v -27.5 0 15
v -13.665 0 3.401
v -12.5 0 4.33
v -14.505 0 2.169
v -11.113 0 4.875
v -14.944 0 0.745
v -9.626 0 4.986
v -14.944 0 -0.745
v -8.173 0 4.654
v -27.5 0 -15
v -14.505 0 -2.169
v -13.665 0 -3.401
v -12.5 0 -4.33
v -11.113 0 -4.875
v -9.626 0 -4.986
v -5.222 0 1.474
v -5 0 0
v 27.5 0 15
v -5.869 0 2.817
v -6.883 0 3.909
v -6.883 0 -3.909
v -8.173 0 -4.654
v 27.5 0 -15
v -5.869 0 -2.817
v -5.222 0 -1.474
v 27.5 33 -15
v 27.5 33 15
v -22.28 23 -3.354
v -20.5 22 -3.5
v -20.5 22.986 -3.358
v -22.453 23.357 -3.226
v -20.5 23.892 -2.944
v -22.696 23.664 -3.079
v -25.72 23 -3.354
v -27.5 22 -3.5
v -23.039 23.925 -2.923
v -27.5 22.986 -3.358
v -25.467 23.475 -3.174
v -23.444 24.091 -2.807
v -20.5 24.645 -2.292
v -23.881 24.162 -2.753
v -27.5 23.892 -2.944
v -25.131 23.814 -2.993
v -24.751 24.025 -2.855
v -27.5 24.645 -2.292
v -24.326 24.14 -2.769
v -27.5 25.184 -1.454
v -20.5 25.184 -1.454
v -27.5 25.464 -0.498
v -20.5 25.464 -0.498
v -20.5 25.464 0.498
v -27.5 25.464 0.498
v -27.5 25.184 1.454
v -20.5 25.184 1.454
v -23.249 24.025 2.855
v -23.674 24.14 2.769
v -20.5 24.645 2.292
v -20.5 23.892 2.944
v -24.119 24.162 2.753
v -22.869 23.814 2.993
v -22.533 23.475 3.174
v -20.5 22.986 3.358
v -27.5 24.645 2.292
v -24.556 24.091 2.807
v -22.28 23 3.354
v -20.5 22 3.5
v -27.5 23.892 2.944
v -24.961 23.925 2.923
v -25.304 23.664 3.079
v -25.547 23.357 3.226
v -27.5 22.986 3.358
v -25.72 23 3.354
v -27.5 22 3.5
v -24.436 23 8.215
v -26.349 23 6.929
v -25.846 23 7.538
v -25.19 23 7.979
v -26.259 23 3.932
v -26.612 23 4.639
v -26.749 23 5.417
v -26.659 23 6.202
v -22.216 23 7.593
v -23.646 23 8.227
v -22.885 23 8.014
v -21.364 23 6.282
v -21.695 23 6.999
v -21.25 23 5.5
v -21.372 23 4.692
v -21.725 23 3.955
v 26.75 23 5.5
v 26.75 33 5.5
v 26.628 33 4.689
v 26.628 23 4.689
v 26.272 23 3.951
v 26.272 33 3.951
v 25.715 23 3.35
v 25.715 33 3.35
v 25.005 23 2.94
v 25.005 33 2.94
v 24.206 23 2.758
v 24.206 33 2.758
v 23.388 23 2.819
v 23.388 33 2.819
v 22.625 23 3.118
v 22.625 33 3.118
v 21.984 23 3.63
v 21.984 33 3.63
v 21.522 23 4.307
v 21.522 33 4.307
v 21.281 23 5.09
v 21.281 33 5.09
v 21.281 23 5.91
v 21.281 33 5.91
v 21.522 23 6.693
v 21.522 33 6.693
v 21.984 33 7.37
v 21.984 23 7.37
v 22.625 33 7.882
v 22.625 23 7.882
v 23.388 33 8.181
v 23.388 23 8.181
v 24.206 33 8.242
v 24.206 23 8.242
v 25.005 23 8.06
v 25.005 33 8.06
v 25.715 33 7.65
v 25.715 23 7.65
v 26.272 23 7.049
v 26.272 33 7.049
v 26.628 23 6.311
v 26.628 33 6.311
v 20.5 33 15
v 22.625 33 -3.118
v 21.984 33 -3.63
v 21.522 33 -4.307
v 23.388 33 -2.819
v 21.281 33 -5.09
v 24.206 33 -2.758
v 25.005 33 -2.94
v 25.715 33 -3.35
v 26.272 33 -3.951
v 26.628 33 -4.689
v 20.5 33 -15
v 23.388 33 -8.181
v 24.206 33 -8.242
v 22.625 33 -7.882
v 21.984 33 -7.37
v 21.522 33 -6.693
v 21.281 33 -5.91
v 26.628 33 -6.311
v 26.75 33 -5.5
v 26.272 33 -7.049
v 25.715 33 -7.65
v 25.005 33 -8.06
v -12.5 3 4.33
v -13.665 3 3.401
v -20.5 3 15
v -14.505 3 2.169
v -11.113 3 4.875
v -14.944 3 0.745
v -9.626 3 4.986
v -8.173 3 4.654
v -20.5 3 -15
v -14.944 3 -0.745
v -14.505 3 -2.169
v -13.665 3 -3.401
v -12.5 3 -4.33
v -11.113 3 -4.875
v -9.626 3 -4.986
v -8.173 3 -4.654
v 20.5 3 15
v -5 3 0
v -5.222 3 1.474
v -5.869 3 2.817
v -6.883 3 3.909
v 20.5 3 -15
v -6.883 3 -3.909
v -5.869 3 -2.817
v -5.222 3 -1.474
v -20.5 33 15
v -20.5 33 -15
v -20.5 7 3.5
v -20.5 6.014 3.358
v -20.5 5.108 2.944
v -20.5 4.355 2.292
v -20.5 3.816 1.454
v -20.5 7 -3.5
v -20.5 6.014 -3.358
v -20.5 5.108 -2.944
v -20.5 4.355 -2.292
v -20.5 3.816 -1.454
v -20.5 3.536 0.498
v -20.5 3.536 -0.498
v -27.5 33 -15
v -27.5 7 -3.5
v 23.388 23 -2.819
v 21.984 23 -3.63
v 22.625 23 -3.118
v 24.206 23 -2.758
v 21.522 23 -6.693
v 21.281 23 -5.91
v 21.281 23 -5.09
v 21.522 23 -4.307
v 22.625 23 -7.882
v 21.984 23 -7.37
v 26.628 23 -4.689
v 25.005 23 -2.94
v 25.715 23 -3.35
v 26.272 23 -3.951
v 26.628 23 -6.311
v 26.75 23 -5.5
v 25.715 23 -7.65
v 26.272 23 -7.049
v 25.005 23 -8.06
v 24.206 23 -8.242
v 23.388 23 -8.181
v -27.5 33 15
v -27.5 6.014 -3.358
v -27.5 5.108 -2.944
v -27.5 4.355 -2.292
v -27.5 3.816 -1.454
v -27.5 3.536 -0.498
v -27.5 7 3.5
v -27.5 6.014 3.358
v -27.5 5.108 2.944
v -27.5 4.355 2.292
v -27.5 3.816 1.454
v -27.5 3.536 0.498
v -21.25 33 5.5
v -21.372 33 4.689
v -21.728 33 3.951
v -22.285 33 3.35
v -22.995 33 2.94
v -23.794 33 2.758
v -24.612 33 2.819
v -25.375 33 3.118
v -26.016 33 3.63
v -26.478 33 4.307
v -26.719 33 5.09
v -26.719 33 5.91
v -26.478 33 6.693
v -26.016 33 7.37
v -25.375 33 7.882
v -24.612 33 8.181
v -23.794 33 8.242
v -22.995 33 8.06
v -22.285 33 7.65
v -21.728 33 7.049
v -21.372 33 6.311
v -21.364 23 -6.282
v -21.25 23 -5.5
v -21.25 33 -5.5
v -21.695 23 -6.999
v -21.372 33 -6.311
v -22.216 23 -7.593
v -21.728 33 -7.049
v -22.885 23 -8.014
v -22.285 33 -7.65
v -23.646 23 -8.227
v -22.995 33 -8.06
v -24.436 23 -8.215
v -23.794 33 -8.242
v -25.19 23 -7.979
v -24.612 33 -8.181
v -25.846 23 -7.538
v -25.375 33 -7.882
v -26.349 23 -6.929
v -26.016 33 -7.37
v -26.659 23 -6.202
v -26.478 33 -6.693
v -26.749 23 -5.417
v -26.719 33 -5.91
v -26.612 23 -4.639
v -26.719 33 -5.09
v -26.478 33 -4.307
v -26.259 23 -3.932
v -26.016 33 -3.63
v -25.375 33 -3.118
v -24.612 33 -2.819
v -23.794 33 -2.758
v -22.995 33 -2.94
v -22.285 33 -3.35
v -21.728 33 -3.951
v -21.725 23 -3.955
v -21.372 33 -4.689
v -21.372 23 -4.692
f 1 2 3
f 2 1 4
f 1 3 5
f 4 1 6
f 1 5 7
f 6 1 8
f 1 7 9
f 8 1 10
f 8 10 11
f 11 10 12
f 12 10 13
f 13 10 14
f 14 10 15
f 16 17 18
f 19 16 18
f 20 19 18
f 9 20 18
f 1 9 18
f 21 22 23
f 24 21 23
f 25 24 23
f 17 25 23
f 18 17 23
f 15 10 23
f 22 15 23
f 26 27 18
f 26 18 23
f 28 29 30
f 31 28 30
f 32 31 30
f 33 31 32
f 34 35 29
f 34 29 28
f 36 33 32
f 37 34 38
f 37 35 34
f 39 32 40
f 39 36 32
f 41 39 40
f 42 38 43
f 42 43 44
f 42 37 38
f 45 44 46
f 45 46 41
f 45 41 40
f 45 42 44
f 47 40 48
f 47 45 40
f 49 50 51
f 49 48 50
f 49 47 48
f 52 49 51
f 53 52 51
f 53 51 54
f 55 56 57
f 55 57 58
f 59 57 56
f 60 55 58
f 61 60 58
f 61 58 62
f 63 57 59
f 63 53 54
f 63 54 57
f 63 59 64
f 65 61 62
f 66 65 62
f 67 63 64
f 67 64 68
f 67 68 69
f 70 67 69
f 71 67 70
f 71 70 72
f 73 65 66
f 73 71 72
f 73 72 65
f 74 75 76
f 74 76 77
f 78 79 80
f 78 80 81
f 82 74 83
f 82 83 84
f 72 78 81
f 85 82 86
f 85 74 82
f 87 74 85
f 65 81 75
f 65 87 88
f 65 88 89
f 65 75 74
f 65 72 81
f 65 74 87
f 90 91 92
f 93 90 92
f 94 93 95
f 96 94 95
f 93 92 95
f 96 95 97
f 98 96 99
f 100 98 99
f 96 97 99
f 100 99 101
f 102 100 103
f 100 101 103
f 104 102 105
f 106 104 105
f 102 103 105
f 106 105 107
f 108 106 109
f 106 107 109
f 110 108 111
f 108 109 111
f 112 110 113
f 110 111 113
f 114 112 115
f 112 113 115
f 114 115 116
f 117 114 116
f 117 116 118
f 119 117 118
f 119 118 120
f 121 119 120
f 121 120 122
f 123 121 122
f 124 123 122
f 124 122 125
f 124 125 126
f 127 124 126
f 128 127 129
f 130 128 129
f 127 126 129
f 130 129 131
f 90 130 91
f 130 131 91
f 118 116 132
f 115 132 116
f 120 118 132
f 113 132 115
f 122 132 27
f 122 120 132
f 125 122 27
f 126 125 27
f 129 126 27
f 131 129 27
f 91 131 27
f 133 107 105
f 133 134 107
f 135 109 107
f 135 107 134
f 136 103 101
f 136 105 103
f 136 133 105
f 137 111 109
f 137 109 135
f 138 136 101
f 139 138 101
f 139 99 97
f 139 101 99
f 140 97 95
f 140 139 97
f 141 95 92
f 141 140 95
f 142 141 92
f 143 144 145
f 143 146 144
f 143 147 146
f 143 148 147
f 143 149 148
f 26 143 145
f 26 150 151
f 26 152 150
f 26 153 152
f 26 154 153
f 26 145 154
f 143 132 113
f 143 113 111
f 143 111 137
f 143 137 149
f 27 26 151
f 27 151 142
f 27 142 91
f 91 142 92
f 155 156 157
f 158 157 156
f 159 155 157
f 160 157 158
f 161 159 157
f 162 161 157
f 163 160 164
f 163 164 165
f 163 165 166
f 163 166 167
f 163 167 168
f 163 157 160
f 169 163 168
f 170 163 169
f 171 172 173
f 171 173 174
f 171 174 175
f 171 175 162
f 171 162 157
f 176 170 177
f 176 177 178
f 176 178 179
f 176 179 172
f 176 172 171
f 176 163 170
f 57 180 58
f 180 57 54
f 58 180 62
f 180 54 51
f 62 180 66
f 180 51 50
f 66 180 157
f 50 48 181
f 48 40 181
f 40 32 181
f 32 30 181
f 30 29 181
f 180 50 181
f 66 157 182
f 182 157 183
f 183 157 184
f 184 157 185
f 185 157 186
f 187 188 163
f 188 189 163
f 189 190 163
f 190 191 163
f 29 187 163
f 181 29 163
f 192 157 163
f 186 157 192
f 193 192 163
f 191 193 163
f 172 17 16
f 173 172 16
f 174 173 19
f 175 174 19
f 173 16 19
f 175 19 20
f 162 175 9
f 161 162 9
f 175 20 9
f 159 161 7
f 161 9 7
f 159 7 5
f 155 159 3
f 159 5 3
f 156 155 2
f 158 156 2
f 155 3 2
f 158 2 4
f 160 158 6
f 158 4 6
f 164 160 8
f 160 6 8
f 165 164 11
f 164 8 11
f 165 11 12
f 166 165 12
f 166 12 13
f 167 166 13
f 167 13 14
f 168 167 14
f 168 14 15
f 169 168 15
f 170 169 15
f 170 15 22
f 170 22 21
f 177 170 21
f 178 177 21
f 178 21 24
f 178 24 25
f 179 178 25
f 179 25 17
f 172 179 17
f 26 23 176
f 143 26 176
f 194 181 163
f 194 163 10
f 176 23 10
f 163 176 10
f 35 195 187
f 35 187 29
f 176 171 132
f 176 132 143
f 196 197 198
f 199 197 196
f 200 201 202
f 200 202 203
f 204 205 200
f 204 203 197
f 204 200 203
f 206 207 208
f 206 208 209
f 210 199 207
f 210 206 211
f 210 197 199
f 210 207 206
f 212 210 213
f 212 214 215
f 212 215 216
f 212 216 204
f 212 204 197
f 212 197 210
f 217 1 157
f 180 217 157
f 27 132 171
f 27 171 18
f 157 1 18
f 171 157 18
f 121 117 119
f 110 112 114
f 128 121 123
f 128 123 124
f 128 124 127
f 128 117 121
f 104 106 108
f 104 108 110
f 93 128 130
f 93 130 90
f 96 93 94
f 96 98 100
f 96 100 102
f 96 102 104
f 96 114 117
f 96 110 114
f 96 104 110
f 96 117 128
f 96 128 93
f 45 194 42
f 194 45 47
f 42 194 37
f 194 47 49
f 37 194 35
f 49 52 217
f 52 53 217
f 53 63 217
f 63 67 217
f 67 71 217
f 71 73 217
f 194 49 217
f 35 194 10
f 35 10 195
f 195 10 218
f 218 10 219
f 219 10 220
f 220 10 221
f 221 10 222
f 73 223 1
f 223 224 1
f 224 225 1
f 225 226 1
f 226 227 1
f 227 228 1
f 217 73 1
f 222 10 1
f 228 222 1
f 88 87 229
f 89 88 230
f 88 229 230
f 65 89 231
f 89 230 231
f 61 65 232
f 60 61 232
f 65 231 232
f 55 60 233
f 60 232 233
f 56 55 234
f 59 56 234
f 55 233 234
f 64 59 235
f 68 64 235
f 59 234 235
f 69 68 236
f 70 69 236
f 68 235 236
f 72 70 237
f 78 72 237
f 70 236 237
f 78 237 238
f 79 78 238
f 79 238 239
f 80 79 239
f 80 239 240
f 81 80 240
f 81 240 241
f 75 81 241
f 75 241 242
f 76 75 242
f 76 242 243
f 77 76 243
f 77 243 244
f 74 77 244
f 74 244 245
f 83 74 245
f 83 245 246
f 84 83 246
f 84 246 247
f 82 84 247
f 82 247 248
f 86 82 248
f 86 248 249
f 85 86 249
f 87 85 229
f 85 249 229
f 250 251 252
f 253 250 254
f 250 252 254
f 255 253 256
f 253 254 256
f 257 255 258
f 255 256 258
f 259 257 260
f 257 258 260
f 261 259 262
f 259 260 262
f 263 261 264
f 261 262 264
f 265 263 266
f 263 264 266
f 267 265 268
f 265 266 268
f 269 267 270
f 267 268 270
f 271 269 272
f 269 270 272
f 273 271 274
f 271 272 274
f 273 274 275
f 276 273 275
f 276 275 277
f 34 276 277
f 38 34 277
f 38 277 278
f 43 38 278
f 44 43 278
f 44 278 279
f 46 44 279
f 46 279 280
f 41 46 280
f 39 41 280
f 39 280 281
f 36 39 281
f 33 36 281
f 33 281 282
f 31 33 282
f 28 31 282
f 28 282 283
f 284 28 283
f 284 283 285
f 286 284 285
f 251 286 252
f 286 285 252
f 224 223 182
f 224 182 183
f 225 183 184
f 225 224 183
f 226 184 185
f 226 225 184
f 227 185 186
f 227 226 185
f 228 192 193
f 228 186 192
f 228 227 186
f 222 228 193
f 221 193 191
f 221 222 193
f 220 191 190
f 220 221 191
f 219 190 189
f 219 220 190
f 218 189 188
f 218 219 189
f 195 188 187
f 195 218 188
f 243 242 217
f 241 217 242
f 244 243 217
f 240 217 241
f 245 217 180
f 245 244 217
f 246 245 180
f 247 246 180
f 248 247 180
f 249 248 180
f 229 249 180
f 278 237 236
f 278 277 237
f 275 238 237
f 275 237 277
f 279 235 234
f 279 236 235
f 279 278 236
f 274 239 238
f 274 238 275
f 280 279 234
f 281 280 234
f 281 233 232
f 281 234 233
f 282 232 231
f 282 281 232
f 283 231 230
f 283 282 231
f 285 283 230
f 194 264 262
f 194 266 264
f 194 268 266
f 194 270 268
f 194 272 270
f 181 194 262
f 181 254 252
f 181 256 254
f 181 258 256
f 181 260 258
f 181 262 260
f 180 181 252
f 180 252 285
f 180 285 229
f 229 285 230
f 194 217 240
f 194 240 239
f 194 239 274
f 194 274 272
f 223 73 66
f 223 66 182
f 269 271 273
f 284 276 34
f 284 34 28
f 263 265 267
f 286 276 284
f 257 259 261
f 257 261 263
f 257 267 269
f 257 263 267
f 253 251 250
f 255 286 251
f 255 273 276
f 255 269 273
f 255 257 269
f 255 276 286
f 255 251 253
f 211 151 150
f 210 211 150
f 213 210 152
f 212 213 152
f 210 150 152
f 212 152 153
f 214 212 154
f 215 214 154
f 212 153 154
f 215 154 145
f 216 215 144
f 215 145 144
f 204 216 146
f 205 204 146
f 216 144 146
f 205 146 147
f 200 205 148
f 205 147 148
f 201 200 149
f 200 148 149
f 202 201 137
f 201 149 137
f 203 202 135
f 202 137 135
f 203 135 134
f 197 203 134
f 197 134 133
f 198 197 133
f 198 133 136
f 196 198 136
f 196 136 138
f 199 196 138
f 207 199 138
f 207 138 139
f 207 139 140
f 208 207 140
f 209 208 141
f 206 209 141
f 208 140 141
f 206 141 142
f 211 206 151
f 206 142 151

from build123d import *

# Parameters (mm, degrees)
SKETCH1_W           = 55
SKETCH1_H           = 30
BOSS_EXTRUDE1_DEPTH = 3
SKETCH2_W           = 7
SKETCH2_H           = 30
BOSS_EXTRUDE2_DEPTH = 30
SKETCH3_R           = 2.75
CUT_EXTRUDE1_DEPTH  = 10
CUT_EXTRUDE2_REACH  = 57
CUT_EXTRUDE3_REACH  = 35
SKETCH5_R           = 5


with BuildPart() as part:
    # Sketch1 → Boss-Extrude1 (new body)
    with BuildSketch(Plane(origin=(0, 0, 0), x_dir=(1, 0, 0), z_dir=(0, 1, 0))):
        Rectangle(SKETCH1_W, SKETCH1_H)
    extrude(amount=BOSS_EXTRUDE1_DEPTH)

    # Sketch2 → Boss-Extrude2 (add)
    with BuildSketch(Plane(origin=(0, 3, 0), x_dir=(1, 0, 0), z_dir=(0, 1, 0))):
        Polygon((-27.5, -12), (-27.5, -15), (-20.5, -15), (-20.5, 15), (-27.5, 15), align=None)
        with Locations((24, 0)):
            Rectangle(SKETCH2_W, SKETCH2_H)
    extrude(amount=BOSS_EXTRUDE2_DEPTH)

    # Sketch3 → Cut-Extrude1 (cut)
    with BuildSketch(Plane(origin=(0, 33, 0), x_dir=(1, 0, 0), z_dir=(0, 1, 0))):
        with Locations((-24, 5.5)):
            Circle(SKETCH3_R)
        with Locations((-24, -5.5)):
            Circle(SKETCH3_R)
        with Locations((24, -5.5)):
            Circle(SKETCH3_R)
        with Locations((24, 5.5)):
            Circle(SKETCH3_R)
    extrude(amount=-CUT_EXTRUDE1_DEPTH, mode=Mode.SUBTRACT)

    # Sketch4 → Cut-Extrude2 (cut, up to next)
    with BuildSketch(Plane.ZY.offset(27.5), mode=Mode.PRIVATE) as cut_extrude2_sk1:
        with BuildLine():
            Line((3.5, 22), (3.5, 7))
            ThreePointArc((3.5, 7), (0, 3.5), (-3.5, 7))
            Line((-3.5, 7), (-3.5, 22))
            ThreePointArc((-3.5, 22), (0, 25.5), (3.5, 22))
        make_face()
    cut_extrude2_tool1 = extrude(cut_extrude2_sk1.sketch, amount=-CUT_EXTRUDE2_REACH, mode=Mode.PRIVATE) & part.part
    add(cut_extrude2_tool1.solids().sort_by_distance((-27.5, 14.5, 0))[0], mode=Mode.SUBTRACT)

    # Sketch5 → Cut-Extrude3 (cut, up to next)
    with BuildSketch(Plane.XZ, mode=Mode.PRIVATE) as cut_extrude3_sk1:
        with Locations((-10, 0)):
            Circle(SKETCH5_R)
    cut_extrude3_tool1 = extrude(cut_extrude3_sk1.sketch, amount=-CUT_EXTRUDE3_REACH, mode=Mode.PRIVATE) & part.part
    add(cut_extrude3_tool1.solids().sort_by_distance((-10, 0, 0))[0], mode=Mode.SUBTRACT)


solid = part.part
